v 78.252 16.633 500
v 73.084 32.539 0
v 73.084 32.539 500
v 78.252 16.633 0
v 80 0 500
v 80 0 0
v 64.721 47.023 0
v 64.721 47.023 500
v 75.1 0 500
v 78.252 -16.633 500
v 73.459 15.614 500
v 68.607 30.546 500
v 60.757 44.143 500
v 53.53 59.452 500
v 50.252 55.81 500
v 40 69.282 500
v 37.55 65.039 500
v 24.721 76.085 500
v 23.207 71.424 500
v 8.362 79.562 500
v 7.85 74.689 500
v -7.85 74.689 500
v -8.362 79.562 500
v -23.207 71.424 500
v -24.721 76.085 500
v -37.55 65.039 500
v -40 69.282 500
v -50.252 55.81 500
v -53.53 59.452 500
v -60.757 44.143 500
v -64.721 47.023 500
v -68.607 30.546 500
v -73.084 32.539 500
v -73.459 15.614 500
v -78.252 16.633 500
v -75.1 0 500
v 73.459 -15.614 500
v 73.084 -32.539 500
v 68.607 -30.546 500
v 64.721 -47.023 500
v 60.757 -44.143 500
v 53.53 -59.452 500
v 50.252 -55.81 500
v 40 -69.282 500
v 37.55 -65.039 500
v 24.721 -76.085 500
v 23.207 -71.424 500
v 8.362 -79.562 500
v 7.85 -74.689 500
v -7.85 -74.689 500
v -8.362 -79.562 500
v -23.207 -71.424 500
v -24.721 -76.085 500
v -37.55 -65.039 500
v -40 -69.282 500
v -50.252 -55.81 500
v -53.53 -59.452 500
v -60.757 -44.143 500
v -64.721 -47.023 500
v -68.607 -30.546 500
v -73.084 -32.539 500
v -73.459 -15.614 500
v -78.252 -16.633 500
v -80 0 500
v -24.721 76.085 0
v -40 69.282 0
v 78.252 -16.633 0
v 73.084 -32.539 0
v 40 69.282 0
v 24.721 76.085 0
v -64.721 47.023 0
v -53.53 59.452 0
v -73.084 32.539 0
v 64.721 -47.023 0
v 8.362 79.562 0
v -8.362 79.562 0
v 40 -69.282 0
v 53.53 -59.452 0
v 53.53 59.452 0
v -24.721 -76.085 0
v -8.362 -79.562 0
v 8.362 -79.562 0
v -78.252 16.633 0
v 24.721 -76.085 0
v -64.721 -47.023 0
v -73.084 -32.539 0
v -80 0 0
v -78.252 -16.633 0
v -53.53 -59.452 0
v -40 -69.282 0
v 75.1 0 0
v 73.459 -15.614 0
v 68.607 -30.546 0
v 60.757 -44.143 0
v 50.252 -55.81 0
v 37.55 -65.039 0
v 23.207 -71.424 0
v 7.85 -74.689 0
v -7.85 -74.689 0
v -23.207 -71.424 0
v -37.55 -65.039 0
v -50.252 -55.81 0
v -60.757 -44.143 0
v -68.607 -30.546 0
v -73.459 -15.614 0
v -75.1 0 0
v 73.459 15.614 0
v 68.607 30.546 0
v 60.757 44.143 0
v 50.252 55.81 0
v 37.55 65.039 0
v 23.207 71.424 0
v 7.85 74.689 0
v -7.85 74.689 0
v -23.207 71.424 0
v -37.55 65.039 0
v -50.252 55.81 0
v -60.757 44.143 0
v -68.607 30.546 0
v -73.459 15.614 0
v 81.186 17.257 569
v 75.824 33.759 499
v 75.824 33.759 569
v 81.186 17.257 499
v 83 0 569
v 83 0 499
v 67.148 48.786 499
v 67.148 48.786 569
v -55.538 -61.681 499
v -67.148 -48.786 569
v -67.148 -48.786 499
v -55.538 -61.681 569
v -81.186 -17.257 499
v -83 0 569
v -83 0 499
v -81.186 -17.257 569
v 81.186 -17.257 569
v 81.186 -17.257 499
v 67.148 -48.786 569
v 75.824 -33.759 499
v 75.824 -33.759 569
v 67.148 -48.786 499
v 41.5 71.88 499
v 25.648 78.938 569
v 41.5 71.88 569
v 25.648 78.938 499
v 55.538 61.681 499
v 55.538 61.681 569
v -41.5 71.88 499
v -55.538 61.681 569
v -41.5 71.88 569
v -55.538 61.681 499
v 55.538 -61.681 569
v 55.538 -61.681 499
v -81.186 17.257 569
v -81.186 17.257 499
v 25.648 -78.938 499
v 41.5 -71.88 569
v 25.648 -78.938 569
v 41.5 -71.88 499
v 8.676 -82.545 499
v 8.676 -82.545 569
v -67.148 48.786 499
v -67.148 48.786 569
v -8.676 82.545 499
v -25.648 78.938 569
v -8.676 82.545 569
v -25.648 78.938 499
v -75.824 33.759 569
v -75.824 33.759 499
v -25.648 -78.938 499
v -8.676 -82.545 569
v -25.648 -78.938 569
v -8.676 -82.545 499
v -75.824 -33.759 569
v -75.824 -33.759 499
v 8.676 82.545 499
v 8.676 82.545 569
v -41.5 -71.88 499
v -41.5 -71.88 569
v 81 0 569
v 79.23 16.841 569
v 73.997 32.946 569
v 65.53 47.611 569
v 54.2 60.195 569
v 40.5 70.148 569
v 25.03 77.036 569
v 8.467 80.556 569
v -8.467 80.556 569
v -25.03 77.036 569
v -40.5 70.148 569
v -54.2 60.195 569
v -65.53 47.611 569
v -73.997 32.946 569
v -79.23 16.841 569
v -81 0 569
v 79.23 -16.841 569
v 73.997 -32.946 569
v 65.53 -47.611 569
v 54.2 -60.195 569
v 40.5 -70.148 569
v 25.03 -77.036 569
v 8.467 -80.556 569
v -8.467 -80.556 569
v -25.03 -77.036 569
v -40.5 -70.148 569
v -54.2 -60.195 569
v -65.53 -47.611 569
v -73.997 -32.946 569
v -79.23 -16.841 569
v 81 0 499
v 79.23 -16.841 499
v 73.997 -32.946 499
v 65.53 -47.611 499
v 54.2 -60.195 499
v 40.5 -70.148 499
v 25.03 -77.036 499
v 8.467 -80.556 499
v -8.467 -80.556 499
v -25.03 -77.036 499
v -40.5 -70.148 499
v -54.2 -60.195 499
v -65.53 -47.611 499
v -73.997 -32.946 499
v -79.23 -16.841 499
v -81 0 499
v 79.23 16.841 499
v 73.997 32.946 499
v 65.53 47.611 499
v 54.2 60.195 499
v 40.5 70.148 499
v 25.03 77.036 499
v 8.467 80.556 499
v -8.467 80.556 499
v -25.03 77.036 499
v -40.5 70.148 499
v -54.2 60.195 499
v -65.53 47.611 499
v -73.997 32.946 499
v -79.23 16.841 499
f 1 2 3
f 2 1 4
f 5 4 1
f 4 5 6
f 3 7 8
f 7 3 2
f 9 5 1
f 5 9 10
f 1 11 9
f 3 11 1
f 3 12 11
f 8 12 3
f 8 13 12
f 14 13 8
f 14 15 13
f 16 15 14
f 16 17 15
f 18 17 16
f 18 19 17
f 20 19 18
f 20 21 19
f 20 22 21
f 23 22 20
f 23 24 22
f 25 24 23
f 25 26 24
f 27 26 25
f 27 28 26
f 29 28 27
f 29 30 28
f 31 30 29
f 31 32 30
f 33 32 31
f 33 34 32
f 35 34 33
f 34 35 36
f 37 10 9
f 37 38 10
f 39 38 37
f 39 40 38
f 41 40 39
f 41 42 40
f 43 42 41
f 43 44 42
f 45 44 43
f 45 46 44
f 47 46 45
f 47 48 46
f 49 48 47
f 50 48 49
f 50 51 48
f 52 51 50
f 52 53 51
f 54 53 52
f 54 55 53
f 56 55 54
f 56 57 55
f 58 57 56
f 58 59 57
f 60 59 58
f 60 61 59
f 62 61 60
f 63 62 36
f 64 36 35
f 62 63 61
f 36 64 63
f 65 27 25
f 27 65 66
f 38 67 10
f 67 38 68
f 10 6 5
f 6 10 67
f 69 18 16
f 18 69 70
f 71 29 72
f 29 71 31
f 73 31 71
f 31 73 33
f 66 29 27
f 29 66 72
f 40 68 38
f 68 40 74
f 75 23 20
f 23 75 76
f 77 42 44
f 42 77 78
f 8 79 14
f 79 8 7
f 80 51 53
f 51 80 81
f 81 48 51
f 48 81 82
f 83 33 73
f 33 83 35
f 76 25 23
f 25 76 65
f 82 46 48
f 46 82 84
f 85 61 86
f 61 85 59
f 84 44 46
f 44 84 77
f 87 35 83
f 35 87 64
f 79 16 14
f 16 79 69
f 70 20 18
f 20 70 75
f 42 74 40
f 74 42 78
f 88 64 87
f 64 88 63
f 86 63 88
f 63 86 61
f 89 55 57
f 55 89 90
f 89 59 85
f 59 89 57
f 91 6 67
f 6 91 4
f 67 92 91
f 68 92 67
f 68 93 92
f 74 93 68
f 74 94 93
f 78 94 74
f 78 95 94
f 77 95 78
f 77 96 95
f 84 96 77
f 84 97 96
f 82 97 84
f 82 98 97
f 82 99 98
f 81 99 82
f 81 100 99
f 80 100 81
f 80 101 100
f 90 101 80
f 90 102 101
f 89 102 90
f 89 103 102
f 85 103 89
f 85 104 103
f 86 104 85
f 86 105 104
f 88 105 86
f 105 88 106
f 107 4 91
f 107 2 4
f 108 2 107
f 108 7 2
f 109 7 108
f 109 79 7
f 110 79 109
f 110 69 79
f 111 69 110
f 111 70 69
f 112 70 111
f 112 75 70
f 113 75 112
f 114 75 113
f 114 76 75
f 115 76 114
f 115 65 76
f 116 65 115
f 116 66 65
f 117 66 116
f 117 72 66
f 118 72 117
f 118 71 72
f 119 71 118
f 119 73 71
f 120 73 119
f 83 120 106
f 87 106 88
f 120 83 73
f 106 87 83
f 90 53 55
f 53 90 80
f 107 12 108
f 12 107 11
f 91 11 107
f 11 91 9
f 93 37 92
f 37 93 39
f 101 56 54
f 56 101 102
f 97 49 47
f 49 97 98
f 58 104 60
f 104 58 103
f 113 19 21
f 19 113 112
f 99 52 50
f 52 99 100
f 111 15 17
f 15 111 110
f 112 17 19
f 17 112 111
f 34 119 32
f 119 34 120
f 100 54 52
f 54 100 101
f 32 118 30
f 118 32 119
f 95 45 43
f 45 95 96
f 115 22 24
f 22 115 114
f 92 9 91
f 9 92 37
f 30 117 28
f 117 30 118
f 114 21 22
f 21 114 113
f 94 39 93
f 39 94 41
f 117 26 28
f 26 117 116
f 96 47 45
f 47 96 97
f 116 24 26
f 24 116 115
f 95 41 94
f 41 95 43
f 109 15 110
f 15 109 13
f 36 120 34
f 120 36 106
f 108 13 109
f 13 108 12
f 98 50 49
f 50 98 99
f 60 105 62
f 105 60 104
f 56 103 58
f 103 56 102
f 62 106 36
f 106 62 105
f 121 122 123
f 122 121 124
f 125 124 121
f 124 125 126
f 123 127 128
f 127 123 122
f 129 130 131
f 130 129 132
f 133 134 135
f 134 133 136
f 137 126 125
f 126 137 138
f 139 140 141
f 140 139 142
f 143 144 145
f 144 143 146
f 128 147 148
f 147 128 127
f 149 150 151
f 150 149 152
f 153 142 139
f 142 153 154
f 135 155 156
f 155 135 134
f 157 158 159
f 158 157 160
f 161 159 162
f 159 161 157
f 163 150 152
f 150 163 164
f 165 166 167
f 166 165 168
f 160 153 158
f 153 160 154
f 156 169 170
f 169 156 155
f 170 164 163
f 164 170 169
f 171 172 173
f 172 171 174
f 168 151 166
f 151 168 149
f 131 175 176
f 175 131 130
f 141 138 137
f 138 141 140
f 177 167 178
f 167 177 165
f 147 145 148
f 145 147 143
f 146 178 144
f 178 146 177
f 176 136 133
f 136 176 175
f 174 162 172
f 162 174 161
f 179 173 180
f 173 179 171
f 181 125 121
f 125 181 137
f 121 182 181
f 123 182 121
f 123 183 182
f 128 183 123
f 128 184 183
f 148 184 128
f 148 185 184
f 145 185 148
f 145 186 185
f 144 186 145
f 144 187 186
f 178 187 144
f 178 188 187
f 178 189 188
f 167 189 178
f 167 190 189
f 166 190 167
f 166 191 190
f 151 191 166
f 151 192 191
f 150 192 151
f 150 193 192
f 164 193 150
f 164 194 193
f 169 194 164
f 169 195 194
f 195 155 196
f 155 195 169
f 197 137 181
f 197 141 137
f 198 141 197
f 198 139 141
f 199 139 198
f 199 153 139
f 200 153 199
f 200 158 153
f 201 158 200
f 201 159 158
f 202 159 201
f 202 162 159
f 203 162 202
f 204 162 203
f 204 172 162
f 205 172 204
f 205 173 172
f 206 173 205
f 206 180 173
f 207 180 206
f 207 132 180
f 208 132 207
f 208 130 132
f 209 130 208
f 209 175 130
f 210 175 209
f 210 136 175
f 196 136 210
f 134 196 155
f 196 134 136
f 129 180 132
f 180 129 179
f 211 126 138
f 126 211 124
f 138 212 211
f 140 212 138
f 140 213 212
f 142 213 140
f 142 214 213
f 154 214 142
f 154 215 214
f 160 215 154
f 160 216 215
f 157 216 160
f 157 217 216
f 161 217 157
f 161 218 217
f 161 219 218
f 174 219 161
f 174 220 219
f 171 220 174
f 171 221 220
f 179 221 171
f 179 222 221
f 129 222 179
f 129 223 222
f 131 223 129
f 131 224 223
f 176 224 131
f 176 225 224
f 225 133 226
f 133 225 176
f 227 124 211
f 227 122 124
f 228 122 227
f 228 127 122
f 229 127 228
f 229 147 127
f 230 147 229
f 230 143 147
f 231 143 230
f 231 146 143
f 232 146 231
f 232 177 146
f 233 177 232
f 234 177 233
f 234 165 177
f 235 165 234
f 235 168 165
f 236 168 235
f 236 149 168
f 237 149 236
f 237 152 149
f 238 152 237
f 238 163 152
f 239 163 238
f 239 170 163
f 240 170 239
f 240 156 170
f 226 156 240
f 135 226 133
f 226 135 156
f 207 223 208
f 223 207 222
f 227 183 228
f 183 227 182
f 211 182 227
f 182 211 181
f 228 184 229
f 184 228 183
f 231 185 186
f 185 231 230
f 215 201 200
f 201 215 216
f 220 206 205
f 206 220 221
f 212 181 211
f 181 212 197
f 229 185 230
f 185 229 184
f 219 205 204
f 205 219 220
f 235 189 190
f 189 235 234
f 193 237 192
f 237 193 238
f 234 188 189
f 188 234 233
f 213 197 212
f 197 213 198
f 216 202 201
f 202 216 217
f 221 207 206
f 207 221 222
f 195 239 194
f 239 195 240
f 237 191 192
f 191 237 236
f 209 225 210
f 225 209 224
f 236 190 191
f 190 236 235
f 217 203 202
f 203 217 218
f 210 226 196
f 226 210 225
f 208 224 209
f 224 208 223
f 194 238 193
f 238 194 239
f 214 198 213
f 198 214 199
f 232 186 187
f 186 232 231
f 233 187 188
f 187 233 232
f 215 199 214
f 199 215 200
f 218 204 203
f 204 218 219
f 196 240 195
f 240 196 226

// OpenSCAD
// Parameters
pipe_standard = 1; //[1:1:1]
nominal_diameter = 160; //[80:320:1]
length_mm = 500; //[250:1000:1]
pipe_od = 160; //[80:320:1]
pipe_wall = 4.9; //[2.5:10:0.1]
socket_length = 70; //[35:140:1]
socket_wall_extra = 3; //[1:8:0.5]
socket_bore_clearance = 1; //[0.2:3:0.1]
overlap = 1; //[0.5:2:0.1]

// HT Pipe - complete geometry
module ht_pipe() {
  color([0.85, 0.85, 0.8]) { // PVC color
    union() {
      // Pipe body
      difference() {
        cylinder(h=length_mm, r=pipe_od/2, center=false);
        translate([0, 0, -overlap])
          cylinder(h=length_mm + overlap*2, r=pipe_od/2 - pipe_wall, center=false);
      }
      // End fitting (socket)
      difference() {
        translate([0, 0, length_mm - overlap])
          cylinder(h=socket_length, r=pipe_od/2 + socket_wall_extra, center=false);
        translate([0, 0, length_mm - overlap - overlap])
          cylinder(h=socket_length + overlap*2, r=pipe_od/2 + socket_bore_clearance, center=false);
      }
    }
  }
}

// Assembly
module assembly() {
  ht_pipe();
}

assembly();
